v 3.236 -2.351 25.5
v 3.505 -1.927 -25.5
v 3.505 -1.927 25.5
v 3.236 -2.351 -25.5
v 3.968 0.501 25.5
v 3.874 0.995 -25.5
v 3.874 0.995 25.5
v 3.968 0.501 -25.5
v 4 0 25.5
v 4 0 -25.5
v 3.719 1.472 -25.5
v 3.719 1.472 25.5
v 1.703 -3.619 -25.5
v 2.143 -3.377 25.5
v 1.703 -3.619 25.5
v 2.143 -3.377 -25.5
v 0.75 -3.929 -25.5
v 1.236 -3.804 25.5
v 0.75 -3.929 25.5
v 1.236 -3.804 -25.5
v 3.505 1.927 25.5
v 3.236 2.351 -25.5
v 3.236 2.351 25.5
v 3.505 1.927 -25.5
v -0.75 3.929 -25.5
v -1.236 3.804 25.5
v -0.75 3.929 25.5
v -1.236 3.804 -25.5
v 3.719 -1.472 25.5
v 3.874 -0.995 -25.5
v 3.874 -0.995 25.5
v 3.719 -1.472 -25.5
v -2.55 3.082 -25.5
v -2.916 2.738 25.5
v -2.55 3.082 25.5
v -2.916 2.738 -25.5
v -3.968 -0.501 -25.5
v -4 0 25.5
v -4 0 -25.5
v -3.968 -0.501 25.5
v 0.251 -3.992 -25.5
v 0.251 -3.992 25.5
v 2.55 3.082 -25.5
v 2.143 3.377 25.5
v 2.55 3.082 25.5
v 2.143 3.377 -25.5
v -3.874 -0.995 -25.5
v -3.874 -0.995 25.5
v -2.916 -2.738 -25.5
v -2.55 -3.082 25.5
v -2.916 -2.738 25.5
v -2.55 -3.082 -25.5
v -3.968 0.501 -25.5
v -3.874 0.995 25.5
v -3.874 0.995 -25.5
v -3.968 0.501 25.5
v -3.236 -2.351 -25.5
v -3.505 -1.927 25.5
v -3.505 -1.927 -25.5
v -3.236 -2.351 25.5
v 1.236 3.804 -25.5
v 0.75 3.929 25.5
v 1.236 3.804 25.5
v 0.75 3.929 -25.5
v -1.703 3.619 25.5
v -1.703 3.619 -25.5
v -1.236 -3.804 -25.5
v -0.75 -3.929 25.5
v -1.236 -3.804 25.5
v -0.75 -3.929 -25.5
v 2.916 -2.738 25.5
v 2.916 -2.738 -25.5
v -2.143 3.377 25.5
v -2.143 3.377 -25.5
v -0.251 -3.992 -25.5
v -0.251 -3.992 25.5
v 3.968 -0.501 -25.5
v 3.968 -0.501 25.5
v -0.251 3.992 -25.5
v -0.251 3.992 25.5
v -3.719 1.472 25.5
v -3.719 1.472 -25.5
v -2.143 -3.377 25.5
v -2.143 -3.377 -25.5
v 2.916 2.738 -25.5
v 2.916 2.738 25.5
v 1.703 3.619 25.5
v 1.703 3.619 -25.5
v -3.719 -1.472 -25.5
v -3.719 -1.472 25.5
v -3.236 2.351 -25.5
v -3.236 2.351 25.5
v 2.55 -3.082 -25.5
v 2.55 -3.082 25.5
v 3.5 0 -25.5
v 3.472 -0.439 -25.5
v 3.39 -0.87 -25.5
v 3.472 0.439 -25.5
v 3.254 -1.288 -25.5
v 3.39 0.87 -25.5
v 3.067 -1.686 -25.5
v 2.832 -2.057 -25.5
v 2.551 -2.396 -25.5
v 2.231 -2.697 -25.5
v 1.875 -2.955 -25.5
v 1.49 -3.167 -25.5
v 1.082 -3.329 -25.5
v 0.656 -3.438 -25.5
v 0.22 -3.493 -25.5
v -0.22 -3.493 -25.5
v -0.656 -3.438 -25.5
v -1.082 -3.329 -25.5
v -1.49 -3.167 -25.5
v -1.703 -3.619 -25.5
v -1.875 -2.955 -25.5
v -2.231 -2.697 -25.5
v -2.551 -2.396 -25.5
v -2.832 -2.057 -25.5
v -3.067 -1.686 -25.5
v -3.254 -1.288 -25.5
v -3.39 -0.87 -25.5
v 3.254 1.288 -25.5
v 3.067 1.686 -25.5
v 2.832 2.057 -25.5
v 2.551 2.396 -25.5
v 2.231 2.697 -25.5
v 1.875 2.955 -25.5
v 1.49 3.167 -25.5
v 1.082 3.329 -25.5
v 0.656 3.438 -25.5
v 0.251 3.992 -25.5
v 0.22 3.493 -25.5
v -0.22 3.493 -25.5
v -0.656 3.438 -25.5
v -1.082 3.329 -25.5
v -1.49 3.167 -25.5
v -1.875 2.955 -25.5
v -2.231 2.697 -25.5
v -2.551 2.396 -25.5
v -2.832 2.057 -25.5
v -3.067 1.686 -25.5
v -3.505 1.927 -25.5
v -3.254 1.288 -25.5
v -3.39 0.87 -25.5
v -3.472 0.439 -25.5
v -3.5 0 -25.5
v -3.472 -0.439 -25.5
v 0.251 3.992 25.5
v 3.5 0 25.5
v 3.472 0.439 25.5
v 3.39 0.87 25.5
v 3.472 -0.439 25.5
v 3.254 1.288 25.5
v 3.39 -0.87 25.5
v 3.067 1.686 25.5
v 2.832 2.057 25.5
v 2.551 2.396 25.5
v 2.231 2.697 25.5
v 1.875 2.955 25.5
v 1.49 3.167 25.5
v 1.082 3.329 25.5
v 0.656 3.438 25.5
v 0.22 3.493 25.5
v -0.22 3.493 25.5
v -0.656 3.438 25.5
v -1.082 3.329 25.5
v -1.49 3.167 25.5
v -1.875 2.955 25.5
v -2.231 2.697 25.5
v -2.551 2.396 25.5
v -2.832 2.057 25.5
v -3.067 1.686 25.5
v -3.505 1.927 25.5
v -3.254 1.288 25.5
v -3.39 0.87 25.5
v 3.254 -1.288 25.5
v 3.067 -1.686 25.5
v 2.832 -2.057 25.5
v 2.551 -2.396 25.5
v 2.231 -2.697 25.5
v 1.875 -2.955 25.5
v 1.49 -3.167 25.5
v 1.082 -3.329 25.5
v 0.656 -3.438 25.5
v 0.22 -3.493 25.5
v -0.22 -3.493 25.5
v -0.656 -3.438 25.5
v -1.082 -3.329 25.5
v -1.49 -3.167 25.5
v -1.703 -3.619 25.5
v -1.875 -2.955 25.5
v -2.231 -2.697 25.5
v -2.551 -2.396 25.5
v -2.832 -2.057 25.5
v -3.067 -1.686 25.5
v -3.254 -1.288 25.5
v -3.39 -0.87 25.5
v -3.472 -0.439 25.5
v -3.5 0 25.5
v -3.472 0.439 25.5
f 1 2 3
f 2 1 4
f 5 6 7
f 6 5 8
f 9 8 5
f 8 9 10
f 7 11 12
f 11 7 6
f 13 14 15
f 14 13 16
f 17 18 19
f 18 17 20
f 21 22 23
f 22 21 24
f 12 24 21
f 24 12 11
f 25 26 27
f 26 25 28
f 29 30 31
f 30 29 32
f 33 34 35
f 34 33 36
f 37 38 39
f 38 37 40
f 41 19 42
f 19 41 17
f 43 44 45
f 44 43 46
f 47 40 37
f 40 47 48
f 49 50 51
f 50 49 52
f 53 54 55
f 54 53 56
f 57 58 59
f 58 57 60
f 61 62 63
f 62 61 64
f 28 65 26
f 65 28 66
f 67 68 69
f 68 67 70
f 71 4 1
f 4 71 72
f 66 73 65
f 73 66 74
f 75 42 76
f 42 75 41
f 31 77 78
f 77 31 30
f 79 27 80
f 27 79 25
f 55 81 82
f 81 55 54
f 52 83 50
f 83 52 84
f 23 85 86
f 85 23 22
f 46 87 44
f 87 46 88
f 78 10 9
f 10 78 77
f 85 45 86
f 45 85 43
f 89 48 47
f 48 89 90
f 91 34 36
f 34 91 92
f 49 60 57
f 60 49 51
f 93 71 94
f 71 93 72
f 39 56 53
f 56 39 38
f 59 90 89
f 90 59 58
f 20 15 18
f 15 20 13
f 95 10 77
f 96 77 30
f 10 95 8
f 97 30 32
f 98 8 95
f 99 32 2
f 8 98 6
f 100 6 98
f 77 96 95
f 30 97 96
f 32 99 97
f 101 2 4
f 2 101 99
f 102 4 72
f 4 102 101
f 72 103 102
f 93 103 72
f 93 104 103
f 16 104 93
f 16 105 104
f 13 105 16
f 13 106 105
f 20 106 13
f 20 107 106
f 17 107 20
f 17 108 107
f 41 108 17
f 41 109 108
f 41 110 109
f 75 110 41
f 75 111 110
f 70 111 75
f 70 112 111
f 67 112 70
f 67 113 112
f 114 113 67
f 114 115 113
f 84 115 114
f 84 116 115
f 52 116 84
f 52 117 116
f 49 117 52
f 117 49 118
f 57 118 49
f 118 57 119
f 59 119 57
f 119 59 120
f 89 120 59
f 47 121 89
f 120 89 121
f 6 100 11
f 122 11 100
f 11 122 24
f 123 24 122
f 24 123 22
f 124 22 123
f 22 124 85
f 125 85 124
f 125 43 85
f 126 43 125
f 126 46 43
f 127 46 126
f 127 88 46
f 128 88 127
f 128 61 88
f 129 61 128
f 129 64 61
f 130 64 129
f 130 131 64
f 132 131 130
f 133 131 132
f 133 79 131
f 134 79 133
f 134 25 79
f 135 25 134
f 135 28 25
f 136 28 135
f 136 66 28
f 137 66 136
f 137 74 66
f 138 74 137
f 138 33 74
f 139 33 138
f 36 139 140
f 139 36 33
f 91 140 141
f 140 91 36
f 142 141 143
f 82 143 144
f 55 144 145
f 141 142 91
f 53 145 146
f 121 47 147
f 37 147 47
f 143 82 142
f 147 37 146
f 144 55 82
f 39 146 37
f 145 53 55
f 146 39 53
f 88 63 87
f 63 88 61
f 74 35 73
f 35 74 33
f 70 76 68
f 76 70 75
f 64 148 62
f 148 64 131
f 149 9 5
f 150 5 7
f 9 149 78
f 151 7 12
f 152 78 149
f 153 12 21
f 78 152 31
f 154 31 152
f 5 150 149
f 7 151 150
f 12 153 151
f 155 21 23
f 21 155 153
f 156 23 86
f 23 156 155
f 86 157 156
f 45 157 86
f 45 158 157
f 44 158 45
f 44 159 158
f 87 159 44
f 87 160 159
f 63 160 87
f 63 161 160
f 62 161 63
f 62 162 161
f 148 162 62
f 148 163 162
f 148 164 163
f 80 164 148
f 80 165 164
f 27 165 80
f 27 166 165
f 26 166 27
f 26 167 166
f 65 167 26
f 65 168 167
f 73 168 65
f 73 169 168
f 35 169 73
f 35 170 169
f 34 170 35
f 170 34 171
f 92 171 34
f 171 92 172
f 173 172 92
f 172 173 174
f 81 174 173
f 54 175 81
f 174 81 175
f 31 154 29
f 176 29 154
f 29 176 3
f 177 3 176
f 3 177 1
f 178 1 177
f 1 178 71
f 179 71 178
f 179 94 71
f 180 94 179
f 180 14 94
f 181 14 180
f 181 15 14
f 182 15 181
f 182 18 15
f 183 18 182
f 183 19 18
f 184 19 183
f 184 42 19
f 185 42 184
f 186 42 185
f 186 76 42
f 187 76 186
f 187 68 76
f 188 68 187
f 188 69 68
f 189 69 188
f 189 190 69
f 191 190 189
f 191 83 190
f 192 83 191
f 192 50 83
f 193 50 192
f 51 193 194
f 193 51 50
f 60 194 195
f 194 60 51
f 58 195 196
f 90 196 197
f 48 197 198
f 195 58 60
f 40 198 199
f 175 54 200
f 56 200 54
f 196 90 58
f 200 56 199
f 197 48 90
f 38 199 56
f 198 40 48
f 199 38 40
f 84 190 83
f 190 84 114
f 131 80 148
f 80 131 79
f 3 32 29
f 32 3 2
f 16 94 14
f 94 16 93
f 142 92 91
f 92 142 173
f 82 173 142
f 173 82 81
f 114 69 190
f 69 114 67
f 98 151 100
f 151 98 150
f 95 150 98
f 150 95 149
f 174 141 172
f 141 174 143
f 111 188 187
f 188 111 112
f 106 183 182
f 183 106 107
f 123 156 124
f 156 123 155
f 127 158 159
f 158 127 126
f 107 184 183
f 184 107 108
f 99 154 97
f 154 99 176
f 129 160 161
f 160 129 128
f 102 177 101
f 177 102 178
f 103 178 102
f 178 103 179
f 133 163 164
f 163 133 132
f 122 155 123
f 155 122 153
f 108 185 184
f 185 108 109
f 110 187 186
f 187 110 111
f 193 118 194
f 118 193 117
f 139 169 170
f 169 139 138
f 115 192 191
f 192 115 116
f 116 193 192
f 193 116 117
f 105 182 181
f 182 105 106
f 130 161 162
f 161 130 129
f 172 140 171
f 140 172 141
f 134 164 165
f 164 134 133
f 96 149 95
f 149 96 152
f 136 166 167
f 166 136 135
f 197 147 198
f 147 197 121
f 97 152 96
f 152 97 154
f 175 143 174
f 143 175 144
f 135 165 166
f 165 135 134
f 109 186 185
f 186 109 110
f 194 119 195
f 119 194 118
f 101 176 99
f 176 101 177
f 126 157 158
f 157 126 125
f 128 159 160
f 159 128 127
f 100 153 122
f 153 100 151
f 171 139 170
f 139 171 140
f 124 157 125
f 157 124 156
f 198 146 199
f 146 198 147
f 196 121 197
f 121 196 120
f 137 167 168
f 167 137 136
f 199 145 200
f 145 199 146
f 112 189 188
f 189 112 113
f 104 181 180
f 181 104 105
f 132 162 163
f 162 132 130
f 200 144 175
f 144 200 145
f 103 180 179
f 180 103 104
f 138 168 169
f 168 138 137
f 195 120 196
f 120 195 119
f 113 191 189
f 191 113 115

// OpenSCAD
$fn = 50;


difference() {
	union() {
		translate(v = [0, 0, -25.5000000000]) {
			cylinder(h = 51, r = 4.0000000000);
		}
	}
	union() {
		translate(v = [0, 0, -100.0000000000]) {
			cylinder(h = 200, r = 3.5000000000);
		}
	}
}
